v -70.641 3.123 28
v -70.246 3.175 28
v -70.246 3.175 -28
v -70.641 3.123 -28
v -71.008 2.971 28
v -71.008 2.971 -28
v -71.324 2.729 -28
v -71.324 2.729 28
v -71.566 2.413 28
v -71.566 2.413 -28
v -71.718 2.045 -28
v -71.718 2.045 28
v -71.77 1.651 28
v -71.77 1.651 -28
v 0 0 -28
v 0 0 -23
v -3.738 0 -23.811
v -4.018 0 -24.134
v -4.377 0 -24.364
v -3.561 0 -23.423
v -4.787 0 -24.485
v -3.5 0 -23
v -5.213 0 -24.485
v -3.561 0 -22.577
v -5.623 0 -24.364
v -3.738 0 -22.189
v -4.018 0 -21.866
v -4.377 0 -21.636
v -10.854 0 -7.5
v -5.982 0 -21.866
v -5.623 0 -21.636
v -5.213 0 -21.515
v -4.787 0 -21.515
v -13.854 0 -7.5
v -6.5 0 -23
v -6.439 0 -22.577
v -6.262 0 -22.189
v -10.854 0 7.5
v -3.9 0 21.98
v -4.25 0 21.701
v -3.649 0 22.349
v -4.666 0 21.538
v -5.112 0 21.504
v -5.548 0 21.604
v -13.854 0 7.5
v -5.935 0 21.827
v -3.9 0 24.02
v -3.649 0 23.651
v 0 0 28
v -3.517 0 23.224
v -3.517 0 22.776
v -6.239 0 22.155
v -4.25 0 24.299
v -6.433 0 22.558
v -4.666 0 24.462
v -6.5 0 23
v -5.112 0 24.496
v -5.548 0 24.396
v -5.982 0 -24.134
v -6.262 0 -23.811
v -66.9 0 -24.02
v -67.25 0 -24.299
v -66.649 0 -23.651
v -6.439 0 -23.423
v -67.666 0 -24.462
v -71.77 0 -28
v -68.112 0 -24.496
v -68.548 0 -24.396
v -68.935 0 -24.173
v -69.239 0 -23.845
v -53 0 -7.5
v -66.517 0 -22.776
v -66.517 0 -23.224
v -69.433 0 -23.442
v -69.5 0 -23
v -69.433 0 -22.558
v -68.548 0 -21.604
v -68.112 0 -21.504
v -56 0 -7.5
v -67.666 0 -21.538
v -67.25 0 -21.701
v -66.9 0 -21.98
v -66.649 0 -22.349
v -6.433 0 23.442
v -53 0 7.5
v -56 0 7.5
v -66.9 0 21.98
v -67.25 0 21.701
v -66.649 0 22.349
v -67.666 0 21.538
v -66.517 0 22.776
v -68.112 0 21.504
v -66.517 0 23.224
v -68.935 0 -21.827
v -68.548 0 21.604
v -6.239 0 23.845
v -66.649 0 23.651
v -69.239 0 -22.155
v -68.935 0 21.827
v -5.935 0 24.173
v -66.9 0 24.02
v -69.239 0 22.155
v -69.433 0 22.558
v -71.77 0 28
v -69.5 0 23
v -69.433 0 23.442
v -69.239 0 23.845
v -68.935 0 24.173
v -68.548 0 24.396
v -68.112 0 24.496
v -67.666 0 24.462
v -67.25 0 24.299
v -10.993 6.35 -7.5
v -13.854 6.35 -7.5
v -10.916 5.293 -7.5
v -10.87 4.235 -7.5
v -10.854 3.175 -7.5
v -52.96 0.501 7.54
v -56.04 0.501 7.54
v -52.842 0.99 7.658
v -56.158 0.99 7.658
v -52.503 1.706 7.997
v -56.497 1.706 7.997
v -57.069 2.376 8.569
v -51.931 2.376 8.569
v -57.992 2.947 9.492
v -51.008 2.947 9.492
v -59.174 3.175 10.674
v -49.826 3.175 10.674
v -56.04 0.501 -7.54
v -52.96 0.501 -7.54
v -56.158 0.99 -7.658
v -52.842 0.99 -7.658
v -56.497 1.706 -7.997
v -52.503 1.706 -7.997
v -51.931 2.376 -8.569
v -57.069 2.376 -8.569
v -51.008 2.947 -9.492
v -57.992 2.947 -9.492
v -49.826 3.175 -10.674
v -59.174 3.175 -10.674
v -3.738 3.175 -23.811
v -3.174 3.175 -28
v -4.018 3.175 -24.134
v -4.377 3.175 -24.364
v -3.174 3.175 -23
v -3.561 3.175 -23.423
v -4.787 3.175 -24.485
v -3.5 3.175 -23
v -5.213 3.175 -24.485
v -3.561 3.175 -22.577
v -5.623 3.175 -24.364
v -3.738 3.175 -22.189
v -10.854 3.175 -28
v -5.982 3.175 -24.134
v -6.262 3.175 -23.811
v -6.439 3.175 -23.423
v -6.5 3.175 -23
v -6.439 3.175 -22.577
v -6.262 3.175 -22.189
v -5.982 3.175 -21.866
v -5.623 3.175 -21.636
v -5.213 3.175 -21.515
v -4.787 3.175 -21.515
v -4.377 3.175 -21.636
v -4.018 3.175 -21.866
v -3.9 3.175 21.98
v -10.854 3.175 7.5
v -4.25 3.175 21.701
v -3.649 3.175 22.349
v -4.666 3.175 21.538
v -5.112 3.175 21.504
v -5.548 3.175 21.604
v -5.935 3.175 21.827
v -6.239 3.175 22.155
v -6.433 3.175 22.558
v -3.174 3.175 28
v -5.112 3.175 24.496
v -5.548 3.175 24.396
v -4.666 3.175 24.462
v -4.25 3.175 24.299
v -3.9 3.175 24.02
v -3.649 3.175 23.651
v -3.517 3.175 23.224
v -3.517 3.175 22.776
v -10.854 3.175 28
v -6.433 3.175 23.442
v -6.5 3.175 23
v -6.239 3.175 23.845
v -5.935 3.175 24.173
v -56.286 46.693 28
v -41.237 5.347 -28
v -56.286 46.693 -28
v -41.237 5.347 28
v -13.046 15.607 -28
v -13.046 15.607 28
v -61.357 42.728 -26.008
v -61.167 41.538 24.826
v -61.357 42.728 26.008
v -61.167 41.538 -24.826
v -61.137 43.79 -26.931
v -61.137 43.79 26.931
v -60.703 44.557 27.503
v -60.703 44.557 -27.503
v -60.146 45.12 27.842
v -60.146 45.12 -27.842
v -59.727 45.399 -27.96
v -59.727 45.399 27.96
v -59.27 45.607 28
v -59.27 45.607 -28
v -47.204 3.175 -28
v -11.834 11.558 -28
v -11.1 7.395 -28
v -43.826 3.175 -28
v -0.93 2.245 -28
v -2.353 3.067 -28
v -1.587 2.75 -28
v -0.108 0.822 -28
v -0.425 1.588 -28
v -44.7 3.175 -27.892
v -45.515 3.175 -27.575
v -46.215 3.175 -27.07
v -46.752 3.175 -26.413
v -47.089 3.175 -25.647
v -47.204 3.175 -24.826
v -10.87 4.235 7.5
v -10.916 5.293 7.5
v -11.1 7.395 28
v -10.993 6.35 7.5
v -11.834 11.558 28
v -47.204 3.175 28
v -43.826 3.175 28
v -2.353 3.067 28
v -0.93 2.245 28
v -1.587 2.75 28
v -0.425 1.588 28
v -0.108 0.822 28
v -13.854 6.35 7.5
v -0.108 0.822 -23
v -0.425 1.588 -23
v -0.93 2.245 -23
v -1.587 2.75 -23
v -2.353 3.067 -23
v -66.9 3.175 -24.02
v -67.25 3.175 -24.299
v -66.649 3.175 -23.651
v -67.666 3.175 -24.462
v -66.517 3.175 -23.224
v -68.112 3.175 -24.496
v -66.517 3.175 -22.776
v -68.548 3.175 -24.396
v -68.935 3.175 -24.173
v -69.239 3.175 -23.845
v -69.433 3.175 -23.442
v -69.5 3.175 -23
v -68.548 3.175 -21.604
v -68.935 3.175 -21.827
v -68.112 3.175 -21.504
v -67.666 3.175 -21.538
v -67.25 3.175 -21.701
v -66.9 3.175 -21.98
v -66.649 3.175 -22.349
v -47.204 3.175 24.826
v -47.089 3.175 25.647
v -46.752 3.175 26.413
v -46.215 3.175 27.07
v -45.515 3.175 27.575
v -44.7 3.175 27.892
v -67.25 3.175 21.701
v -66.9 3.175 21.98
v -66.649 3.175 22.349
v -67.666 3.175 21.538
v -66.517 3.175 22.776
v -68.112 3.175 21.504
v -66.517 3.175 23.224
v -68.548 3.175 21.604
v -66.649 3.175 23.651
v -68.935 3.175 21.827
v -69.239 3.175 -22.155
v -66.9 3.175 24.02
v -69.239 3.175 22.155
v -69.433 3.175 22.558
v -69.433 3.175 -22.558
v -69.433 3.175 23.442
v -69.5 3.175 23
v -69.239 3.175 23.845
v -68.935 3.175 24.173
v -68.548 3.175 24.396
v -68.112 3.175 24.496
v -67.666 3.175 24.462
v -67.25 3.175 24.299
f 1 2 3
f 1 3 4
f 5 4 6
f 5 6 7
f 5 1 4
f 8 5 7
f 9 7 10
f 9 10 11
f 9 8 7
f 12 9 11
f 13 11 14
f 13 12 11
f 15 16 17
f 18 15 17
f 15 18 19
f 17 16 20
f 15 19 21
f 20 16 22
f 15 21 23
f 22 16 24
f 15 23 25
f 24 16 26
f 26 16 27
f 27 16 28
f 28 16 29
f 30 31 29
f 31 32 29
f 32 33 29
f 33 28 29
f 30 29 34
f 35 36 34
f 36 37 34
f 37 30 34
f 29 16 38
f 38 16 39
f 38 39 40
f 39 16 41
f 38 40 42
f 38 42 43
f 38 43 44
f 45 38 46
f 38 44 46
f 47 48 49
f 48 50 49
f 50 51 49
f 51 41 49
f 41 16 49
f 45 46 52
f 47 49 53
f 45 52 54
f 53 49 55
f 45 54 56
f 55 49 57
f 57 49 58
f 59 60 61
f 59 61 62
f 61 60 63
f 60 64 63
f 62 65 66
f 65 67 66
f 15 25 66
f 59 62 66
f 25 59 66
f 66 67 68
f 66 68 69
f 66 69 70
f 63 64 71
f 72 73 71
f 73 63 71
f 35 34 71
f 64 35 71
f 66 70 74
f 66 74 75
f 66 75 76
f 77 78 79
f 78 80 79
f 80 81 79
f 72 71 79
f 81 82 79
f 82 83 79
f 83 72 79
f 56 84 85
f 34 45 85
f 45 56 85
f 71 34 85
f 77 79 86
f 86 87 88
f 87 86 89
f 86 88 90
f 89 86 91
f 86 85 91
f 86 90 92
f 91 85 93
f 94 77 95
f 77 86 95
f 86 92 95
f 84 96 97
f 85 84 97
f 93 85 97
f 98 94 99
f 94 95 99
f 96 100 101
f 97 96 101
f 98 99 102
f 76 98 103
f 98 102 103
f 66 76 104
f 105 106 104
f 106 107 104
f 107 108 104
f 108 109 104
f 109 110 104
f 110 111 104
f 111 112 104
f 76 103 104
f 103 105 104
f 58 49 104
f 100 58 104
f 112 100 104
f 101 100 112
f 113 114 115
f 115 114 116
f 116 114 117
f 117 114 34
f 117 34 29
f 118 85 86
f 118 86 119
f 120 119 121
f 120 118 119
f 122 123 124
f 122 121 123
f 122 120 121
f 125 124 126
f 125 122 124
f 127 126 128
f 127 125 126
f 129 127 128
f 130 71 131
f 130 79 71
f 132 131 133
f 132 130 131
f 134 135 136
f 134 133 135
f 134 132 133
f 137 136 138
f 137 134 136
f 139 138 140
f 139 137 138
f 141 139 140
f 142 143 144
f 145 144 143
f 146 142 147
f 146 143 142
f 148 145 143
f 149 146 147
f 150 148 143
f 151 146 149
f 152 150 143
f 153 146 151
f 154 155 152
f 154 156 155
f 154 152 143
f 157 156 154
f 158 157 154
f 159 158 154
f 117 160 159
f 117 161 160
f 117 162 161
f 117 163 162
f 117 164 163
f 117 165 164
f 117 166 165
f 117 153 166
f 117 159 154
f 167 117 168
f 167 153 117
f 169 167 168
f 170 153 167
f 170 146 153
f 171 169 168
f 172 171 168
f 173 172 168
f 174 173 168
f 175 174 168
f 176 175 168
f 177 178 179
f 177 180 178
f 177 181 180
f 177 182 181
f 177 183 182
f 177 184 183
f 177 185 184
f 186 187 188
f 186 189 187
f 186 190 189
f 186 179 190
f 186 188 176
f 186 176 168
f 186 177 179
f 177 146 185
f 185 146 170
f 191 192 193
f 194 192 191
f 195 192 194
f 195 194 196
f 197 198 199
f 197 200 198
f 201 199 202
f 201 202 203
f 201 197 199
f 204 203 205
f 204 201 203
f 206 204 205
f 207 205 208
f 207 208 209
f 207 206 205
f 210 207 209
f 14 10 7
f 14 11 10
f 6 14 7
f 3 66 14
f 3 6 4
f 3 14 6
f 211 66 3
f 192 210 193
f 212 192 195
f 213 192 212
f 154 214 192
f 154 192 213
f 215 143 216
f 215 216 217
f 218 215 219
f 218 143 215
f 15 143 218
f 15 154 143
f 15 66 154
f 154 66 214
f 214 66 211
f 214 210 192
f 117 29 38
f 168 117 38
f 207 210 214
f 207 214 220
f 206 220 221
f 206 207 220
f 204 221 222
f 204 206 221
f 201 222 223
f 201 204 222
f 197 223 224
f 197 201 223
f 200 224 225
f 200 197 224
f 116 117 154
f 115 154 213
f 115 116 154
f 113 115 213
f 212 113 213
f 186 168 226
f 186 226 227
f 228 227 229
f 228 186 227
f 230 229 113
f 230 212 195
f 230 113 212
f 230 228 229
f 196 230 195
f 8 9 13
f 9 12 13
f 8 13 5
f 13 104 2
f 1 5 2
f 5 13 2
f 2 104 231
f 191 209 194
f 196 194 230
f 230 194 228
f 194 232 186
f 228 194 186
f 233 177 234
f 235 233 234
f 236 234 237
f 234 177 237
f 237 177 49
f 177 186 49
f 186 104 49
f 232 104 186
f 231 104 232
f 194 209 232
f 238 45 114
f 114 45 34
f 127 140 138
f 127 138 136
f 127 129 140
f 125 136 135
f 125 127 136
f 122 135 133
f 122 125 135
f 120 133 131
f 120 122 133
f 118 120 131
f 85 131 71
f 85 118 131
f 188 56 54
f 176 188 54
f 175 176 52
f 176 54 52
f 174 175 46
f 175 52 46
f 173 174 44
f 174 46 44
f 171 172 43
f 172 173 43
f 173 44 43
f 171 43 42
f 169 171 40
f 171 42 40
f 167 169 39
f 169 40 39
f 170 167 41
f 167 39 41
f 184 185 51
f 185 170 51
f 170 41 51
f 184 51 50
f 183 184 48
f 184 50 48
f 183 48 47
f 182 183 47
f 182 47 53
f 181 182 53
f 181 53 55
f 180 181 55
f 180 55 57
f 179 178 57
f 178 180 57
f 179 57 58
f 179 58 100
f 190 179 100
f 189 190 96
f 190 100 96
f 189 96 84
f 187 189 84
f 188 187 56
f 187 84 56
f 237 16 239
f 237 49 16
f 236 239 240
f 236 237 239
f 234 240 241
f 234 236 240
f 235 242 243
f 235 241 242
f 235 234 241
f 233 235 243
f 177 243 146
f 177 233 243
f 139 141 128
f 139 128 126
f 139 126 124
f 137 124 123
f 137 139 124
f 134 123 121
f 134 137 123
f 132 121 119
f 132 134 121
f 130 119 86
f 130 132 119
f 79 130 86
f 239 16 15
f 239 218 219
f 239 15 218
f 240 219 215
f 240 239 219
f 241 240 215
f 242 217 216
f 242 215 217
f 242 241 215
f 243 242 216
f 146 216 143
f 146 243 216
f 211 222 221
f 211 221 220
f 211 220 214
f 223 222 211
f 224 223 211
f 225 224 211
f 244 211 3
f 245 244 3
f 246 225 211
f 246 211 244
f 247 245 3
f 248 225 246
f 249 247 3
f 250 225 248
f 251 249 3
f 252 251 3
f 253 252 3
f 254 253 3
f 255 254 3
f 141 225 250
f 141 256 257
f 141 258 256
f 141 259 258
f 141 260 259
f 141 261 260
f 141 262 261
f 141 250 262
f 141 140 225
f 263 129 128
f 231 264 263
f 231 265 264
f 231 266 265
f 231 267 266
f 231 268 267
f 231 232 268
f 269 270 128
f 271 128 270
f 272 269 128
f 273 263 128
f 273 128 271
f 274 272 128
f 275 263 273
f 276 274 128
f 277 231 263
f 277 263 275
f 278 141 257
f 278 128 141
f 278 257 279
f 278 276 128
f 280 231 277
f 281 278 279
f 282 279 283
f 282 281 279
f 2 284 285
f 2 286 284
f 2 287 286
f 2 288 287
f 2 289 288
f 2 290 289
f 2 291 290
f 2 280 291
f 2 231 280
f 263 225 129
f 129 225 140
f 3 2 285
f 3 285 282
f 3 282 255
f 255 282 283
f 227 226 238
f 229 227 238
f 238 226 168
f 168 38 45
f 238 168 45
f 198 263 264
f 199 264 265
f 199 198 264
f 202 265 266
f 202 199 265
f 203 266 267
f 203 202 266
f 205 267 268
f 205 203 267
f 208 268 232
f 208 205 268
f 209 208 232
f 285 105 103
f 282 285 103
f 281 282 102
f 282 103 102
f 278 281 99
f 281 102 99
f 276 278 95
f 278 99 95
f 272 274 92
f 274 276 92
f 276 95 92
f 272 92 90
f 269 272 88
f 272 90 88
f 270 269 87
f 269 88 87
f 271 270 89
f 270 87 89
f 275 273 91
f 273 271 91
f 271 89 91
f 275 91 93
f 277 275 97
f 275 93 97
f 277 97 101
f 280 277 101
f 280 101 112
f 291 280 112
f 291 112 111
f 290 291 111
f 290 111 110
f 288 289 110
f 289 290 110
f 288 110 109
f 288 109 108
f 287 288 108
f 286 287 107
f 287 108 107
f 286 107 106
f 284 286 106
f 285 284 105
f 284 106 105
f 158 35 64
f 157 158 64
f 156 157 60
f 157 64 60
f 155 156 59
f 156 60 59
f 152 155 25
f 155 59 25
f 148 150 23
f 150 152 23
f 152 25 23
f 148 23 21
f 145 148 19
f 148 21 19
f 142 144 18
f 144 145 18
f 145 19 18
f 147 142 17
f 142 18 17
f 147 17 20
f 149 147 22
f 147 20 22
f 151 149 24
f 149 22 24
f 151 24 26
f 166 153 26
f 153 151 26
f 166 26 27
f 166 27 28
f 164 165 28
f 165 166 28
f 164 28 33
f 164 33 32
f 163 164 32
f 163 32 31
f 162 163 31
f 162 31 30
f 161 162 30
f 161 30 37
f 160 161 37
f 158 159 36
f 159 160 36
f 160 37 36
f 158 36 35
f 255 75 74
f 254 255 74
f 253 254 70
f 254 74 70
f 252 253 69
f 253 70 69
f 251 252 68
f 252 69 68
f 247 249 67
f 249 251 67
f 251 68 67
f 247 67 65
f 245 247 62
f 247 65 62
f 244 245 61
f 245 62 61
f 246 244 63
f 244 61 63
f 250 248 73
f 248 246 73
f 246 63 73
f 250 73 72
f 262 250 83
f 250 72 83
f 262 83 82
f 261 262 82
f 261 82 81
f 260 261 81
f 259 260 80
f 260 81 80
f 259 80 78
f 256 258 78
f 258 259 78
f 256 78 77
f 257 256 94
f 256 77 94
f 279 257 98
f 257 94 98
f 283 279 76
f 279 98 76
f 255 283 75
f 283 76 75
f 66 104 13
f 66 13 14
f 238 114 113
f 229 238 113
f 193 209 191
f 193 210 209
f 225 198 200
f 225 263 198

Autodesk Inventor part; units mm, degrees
ref_plane "YZ Plane" through (0, 0, 0) normal (1, 0, 0) x (0, 1, 0)
ref_plane "XZ Plane" through (0, 0, 0) normal (0, 1, 0) x (-1, 0, 0)
ref_plane "XY Plane" through (0, 0, 0) normal (0, 0, 1) x (1, 0, 0)
sketch "Sketch1" plane through (0, 0, 0) normal (0, 1, 0) x (-1, 0, 0)
  line L0 (0, 0) -> (0, 28)
  line L1 (0, 28) -> (0, 23)
  circle A0 centre (5, 23) radius 1.5
  circle A1 centre (68, 23) radius 1.5
  line L2 (0, 28) -> (71.7701, 28)
  line L3 (71.7701, 28) -> (71.7701, 0)
  line L4 (71.7701, 0) -> (0, 0)
  line L5 (0, 0) -> (0, -28)
  line L6 (0, -28) -> (0, -23)
  line L7 (0, -23) -> (5, -23)
  circle A2 centre (5, -23) radius 1.5
  circle A3 centre (68, -23) radius 1.5
  line L8 (0, -28) -> (71.7701, -28)
  line L9 (71.7701, -28) -> (71.7701, 0)
  dimension "d0" = 28
  dimension "d4" = 3
  dimension "d6" = 3
extrude "Extrusion1" add sketch "Sketch1" along normal blind 3.175
sketch "Sketch2" plane through (0, 3.175, 0) normal (0, 1, 0) x (1, 0, 0)
  line L0 (0, 28) -> (-71.7701, 28) projected
  line L1 (-10.8543, 28) -> (-10.8543, -28)
  line L2 (-71.7701, -28) -> (0, -28) projected
  line L3 (-10.8543, -28) -> (-40.8543, -28)
  line L4 (-40.8543, -28) -> (-40.8543, 28)
  line L5 (-40.8543, 28) -> (-10.8543, 28)
  line L6 (-40.8543, -28) -> (-47.2043, -28)
  line L7 (-47.2043, -28) -> (-47.2043, 28)
  line L8 (-40.8543, 28) -> (-47.2043, 28)
  point P0 (0, 0)
  dimension "d9" = 30
  dimension "d10" = 6.35
revolve "Revolution1" add sketch "Sketch2" angle 20 about axis through (-47.2043, 3.175, 28) along (0, 0, 1)
sketch "Sketch3" plane through (-47.2043, 3.175, 28) normal (-0.342, 0.9397, 0) x (0.9397, 0.342, 0)
  line L0 (0, 0) -> (0, 56) projected
  line L1 (0, 56) -> (6.35, 56)
  line L2 (43.2716, 56) -> (-24.1703, 56) projected
  line L3 (6.35, 56) -> (6.35, 0)
  line L4 (0, 0) -> (36.35, 0) projected
  line L5 (-23.0843, 0) -> (0, 0) projected
  line L6 (6.35, 0) -> (0, 0)
  line L7 (0, 0) -> (0, 56)
  point P0 (43.2716, 28)
  dimension "d12" = 6.35
extrude "Extrusion2" add sketch "Sketch3" along normal blind 44
sketch "Sketch4" plane through (0, 3.175, 0) normal (0, 1, 0) x (1, 0, 0)
  line L0 (-10.8543, 28) -> (-10.8543, -28) projected
  line L1 (-10.8543, 0) -> (-10.8543, -7.5)
  line L2 (-10.8543, -7.5) -> (-13.8543, -7.5)
  line L3 (-13.8543, -7.5) -> (-13.8543, 0)
  line L4 (-13.8543, 0) -> (-13.8543, 7.5)
  line L5 (-13.8543, 7.5) -> (-10.8543, 7.5)
  line L6 (-10.8543, 7.5) -> (-10.8543, 0)
  point P0 (0, 0)
  dimension "d15" = 7.5
  dimension "d16" = 3
  dimension "d17" = 7.5
extrude "Extrusion3" cut sketch "Sketch4" along normal mid plane 6.35
sketch "Sketch5" plane through (0, 3.175, 0) normal (0, 1, 0) x (1, 0, 0)
  line L0 (0, 28) -> (-10.8543, 28) projected
  line L1 (0, 28) -> (-53, 28)
  line L2 (0, 28) -> (-71.7701, 28) projected
  line L3 (-53, 0) -> (-53, 7.5)
  line L4 (-53, 7.5) -> (-56, 7.5)
  line L5 (-56, 7.5) -> (-56, 0)
  line L6 (-56, 0) -> (-56, -7.5)
  line L7 (-56, -7.5) -> (-53, -7.5)
  line L8 (-53, -7.5) -> (-53, 0)
  point P0 (0, 0)
  dimension "d20" = 53
  dimension "d21" = 7.5
  dimension "d22" = 3
  dimension "d23" = 7.5
extrude "Extrusion4" cut sketch "Sketch5" against normal blind 6.35
fillet "Fillet1" radius 3.175 8 edges at (0, 3.175, 0) (-54.7287, 23.8482, 28) (-54.7287, 23.8482, -28) (-62.2532, 44.5215, 0) (-56, 3.175, 0) (-53, 3.175, 0) (-54.5, 3.175, -7.5) (-54.5, 3.175, 7.5)
fillet "Fillet2" radius 1.524 1 edges at (-71.7701, 3.175, 0)
sketch "Sketch6" plane through (-41.2373, 5.3468, 28) normal (0.9397, 0.342, 0) x (0, 0, -1)
  line L0 (0, 44) -> (3.175, 40.825) projected
  line L1 (52.825, 40.825) -> (56, 44) projected
  line L2 (0, 44) -> (56, 44)
  point P0 (28, -19.1283)
sketch "Sketch7" plane through (-41.2373, 5.3468, 28) normal (0.9397, 0.342, 0) x (0, 0, -1)
  line L0 (0, -1.1556) -> (0, 44) projected
  line L1 (0, 0) -> (0, 44)
  line L2 (56, -1.1556) -> (56, 7.8808) projected
  point P0 (28, -19.1283)
  point P1 (56, 44)
properties part number "_3DPrint"
